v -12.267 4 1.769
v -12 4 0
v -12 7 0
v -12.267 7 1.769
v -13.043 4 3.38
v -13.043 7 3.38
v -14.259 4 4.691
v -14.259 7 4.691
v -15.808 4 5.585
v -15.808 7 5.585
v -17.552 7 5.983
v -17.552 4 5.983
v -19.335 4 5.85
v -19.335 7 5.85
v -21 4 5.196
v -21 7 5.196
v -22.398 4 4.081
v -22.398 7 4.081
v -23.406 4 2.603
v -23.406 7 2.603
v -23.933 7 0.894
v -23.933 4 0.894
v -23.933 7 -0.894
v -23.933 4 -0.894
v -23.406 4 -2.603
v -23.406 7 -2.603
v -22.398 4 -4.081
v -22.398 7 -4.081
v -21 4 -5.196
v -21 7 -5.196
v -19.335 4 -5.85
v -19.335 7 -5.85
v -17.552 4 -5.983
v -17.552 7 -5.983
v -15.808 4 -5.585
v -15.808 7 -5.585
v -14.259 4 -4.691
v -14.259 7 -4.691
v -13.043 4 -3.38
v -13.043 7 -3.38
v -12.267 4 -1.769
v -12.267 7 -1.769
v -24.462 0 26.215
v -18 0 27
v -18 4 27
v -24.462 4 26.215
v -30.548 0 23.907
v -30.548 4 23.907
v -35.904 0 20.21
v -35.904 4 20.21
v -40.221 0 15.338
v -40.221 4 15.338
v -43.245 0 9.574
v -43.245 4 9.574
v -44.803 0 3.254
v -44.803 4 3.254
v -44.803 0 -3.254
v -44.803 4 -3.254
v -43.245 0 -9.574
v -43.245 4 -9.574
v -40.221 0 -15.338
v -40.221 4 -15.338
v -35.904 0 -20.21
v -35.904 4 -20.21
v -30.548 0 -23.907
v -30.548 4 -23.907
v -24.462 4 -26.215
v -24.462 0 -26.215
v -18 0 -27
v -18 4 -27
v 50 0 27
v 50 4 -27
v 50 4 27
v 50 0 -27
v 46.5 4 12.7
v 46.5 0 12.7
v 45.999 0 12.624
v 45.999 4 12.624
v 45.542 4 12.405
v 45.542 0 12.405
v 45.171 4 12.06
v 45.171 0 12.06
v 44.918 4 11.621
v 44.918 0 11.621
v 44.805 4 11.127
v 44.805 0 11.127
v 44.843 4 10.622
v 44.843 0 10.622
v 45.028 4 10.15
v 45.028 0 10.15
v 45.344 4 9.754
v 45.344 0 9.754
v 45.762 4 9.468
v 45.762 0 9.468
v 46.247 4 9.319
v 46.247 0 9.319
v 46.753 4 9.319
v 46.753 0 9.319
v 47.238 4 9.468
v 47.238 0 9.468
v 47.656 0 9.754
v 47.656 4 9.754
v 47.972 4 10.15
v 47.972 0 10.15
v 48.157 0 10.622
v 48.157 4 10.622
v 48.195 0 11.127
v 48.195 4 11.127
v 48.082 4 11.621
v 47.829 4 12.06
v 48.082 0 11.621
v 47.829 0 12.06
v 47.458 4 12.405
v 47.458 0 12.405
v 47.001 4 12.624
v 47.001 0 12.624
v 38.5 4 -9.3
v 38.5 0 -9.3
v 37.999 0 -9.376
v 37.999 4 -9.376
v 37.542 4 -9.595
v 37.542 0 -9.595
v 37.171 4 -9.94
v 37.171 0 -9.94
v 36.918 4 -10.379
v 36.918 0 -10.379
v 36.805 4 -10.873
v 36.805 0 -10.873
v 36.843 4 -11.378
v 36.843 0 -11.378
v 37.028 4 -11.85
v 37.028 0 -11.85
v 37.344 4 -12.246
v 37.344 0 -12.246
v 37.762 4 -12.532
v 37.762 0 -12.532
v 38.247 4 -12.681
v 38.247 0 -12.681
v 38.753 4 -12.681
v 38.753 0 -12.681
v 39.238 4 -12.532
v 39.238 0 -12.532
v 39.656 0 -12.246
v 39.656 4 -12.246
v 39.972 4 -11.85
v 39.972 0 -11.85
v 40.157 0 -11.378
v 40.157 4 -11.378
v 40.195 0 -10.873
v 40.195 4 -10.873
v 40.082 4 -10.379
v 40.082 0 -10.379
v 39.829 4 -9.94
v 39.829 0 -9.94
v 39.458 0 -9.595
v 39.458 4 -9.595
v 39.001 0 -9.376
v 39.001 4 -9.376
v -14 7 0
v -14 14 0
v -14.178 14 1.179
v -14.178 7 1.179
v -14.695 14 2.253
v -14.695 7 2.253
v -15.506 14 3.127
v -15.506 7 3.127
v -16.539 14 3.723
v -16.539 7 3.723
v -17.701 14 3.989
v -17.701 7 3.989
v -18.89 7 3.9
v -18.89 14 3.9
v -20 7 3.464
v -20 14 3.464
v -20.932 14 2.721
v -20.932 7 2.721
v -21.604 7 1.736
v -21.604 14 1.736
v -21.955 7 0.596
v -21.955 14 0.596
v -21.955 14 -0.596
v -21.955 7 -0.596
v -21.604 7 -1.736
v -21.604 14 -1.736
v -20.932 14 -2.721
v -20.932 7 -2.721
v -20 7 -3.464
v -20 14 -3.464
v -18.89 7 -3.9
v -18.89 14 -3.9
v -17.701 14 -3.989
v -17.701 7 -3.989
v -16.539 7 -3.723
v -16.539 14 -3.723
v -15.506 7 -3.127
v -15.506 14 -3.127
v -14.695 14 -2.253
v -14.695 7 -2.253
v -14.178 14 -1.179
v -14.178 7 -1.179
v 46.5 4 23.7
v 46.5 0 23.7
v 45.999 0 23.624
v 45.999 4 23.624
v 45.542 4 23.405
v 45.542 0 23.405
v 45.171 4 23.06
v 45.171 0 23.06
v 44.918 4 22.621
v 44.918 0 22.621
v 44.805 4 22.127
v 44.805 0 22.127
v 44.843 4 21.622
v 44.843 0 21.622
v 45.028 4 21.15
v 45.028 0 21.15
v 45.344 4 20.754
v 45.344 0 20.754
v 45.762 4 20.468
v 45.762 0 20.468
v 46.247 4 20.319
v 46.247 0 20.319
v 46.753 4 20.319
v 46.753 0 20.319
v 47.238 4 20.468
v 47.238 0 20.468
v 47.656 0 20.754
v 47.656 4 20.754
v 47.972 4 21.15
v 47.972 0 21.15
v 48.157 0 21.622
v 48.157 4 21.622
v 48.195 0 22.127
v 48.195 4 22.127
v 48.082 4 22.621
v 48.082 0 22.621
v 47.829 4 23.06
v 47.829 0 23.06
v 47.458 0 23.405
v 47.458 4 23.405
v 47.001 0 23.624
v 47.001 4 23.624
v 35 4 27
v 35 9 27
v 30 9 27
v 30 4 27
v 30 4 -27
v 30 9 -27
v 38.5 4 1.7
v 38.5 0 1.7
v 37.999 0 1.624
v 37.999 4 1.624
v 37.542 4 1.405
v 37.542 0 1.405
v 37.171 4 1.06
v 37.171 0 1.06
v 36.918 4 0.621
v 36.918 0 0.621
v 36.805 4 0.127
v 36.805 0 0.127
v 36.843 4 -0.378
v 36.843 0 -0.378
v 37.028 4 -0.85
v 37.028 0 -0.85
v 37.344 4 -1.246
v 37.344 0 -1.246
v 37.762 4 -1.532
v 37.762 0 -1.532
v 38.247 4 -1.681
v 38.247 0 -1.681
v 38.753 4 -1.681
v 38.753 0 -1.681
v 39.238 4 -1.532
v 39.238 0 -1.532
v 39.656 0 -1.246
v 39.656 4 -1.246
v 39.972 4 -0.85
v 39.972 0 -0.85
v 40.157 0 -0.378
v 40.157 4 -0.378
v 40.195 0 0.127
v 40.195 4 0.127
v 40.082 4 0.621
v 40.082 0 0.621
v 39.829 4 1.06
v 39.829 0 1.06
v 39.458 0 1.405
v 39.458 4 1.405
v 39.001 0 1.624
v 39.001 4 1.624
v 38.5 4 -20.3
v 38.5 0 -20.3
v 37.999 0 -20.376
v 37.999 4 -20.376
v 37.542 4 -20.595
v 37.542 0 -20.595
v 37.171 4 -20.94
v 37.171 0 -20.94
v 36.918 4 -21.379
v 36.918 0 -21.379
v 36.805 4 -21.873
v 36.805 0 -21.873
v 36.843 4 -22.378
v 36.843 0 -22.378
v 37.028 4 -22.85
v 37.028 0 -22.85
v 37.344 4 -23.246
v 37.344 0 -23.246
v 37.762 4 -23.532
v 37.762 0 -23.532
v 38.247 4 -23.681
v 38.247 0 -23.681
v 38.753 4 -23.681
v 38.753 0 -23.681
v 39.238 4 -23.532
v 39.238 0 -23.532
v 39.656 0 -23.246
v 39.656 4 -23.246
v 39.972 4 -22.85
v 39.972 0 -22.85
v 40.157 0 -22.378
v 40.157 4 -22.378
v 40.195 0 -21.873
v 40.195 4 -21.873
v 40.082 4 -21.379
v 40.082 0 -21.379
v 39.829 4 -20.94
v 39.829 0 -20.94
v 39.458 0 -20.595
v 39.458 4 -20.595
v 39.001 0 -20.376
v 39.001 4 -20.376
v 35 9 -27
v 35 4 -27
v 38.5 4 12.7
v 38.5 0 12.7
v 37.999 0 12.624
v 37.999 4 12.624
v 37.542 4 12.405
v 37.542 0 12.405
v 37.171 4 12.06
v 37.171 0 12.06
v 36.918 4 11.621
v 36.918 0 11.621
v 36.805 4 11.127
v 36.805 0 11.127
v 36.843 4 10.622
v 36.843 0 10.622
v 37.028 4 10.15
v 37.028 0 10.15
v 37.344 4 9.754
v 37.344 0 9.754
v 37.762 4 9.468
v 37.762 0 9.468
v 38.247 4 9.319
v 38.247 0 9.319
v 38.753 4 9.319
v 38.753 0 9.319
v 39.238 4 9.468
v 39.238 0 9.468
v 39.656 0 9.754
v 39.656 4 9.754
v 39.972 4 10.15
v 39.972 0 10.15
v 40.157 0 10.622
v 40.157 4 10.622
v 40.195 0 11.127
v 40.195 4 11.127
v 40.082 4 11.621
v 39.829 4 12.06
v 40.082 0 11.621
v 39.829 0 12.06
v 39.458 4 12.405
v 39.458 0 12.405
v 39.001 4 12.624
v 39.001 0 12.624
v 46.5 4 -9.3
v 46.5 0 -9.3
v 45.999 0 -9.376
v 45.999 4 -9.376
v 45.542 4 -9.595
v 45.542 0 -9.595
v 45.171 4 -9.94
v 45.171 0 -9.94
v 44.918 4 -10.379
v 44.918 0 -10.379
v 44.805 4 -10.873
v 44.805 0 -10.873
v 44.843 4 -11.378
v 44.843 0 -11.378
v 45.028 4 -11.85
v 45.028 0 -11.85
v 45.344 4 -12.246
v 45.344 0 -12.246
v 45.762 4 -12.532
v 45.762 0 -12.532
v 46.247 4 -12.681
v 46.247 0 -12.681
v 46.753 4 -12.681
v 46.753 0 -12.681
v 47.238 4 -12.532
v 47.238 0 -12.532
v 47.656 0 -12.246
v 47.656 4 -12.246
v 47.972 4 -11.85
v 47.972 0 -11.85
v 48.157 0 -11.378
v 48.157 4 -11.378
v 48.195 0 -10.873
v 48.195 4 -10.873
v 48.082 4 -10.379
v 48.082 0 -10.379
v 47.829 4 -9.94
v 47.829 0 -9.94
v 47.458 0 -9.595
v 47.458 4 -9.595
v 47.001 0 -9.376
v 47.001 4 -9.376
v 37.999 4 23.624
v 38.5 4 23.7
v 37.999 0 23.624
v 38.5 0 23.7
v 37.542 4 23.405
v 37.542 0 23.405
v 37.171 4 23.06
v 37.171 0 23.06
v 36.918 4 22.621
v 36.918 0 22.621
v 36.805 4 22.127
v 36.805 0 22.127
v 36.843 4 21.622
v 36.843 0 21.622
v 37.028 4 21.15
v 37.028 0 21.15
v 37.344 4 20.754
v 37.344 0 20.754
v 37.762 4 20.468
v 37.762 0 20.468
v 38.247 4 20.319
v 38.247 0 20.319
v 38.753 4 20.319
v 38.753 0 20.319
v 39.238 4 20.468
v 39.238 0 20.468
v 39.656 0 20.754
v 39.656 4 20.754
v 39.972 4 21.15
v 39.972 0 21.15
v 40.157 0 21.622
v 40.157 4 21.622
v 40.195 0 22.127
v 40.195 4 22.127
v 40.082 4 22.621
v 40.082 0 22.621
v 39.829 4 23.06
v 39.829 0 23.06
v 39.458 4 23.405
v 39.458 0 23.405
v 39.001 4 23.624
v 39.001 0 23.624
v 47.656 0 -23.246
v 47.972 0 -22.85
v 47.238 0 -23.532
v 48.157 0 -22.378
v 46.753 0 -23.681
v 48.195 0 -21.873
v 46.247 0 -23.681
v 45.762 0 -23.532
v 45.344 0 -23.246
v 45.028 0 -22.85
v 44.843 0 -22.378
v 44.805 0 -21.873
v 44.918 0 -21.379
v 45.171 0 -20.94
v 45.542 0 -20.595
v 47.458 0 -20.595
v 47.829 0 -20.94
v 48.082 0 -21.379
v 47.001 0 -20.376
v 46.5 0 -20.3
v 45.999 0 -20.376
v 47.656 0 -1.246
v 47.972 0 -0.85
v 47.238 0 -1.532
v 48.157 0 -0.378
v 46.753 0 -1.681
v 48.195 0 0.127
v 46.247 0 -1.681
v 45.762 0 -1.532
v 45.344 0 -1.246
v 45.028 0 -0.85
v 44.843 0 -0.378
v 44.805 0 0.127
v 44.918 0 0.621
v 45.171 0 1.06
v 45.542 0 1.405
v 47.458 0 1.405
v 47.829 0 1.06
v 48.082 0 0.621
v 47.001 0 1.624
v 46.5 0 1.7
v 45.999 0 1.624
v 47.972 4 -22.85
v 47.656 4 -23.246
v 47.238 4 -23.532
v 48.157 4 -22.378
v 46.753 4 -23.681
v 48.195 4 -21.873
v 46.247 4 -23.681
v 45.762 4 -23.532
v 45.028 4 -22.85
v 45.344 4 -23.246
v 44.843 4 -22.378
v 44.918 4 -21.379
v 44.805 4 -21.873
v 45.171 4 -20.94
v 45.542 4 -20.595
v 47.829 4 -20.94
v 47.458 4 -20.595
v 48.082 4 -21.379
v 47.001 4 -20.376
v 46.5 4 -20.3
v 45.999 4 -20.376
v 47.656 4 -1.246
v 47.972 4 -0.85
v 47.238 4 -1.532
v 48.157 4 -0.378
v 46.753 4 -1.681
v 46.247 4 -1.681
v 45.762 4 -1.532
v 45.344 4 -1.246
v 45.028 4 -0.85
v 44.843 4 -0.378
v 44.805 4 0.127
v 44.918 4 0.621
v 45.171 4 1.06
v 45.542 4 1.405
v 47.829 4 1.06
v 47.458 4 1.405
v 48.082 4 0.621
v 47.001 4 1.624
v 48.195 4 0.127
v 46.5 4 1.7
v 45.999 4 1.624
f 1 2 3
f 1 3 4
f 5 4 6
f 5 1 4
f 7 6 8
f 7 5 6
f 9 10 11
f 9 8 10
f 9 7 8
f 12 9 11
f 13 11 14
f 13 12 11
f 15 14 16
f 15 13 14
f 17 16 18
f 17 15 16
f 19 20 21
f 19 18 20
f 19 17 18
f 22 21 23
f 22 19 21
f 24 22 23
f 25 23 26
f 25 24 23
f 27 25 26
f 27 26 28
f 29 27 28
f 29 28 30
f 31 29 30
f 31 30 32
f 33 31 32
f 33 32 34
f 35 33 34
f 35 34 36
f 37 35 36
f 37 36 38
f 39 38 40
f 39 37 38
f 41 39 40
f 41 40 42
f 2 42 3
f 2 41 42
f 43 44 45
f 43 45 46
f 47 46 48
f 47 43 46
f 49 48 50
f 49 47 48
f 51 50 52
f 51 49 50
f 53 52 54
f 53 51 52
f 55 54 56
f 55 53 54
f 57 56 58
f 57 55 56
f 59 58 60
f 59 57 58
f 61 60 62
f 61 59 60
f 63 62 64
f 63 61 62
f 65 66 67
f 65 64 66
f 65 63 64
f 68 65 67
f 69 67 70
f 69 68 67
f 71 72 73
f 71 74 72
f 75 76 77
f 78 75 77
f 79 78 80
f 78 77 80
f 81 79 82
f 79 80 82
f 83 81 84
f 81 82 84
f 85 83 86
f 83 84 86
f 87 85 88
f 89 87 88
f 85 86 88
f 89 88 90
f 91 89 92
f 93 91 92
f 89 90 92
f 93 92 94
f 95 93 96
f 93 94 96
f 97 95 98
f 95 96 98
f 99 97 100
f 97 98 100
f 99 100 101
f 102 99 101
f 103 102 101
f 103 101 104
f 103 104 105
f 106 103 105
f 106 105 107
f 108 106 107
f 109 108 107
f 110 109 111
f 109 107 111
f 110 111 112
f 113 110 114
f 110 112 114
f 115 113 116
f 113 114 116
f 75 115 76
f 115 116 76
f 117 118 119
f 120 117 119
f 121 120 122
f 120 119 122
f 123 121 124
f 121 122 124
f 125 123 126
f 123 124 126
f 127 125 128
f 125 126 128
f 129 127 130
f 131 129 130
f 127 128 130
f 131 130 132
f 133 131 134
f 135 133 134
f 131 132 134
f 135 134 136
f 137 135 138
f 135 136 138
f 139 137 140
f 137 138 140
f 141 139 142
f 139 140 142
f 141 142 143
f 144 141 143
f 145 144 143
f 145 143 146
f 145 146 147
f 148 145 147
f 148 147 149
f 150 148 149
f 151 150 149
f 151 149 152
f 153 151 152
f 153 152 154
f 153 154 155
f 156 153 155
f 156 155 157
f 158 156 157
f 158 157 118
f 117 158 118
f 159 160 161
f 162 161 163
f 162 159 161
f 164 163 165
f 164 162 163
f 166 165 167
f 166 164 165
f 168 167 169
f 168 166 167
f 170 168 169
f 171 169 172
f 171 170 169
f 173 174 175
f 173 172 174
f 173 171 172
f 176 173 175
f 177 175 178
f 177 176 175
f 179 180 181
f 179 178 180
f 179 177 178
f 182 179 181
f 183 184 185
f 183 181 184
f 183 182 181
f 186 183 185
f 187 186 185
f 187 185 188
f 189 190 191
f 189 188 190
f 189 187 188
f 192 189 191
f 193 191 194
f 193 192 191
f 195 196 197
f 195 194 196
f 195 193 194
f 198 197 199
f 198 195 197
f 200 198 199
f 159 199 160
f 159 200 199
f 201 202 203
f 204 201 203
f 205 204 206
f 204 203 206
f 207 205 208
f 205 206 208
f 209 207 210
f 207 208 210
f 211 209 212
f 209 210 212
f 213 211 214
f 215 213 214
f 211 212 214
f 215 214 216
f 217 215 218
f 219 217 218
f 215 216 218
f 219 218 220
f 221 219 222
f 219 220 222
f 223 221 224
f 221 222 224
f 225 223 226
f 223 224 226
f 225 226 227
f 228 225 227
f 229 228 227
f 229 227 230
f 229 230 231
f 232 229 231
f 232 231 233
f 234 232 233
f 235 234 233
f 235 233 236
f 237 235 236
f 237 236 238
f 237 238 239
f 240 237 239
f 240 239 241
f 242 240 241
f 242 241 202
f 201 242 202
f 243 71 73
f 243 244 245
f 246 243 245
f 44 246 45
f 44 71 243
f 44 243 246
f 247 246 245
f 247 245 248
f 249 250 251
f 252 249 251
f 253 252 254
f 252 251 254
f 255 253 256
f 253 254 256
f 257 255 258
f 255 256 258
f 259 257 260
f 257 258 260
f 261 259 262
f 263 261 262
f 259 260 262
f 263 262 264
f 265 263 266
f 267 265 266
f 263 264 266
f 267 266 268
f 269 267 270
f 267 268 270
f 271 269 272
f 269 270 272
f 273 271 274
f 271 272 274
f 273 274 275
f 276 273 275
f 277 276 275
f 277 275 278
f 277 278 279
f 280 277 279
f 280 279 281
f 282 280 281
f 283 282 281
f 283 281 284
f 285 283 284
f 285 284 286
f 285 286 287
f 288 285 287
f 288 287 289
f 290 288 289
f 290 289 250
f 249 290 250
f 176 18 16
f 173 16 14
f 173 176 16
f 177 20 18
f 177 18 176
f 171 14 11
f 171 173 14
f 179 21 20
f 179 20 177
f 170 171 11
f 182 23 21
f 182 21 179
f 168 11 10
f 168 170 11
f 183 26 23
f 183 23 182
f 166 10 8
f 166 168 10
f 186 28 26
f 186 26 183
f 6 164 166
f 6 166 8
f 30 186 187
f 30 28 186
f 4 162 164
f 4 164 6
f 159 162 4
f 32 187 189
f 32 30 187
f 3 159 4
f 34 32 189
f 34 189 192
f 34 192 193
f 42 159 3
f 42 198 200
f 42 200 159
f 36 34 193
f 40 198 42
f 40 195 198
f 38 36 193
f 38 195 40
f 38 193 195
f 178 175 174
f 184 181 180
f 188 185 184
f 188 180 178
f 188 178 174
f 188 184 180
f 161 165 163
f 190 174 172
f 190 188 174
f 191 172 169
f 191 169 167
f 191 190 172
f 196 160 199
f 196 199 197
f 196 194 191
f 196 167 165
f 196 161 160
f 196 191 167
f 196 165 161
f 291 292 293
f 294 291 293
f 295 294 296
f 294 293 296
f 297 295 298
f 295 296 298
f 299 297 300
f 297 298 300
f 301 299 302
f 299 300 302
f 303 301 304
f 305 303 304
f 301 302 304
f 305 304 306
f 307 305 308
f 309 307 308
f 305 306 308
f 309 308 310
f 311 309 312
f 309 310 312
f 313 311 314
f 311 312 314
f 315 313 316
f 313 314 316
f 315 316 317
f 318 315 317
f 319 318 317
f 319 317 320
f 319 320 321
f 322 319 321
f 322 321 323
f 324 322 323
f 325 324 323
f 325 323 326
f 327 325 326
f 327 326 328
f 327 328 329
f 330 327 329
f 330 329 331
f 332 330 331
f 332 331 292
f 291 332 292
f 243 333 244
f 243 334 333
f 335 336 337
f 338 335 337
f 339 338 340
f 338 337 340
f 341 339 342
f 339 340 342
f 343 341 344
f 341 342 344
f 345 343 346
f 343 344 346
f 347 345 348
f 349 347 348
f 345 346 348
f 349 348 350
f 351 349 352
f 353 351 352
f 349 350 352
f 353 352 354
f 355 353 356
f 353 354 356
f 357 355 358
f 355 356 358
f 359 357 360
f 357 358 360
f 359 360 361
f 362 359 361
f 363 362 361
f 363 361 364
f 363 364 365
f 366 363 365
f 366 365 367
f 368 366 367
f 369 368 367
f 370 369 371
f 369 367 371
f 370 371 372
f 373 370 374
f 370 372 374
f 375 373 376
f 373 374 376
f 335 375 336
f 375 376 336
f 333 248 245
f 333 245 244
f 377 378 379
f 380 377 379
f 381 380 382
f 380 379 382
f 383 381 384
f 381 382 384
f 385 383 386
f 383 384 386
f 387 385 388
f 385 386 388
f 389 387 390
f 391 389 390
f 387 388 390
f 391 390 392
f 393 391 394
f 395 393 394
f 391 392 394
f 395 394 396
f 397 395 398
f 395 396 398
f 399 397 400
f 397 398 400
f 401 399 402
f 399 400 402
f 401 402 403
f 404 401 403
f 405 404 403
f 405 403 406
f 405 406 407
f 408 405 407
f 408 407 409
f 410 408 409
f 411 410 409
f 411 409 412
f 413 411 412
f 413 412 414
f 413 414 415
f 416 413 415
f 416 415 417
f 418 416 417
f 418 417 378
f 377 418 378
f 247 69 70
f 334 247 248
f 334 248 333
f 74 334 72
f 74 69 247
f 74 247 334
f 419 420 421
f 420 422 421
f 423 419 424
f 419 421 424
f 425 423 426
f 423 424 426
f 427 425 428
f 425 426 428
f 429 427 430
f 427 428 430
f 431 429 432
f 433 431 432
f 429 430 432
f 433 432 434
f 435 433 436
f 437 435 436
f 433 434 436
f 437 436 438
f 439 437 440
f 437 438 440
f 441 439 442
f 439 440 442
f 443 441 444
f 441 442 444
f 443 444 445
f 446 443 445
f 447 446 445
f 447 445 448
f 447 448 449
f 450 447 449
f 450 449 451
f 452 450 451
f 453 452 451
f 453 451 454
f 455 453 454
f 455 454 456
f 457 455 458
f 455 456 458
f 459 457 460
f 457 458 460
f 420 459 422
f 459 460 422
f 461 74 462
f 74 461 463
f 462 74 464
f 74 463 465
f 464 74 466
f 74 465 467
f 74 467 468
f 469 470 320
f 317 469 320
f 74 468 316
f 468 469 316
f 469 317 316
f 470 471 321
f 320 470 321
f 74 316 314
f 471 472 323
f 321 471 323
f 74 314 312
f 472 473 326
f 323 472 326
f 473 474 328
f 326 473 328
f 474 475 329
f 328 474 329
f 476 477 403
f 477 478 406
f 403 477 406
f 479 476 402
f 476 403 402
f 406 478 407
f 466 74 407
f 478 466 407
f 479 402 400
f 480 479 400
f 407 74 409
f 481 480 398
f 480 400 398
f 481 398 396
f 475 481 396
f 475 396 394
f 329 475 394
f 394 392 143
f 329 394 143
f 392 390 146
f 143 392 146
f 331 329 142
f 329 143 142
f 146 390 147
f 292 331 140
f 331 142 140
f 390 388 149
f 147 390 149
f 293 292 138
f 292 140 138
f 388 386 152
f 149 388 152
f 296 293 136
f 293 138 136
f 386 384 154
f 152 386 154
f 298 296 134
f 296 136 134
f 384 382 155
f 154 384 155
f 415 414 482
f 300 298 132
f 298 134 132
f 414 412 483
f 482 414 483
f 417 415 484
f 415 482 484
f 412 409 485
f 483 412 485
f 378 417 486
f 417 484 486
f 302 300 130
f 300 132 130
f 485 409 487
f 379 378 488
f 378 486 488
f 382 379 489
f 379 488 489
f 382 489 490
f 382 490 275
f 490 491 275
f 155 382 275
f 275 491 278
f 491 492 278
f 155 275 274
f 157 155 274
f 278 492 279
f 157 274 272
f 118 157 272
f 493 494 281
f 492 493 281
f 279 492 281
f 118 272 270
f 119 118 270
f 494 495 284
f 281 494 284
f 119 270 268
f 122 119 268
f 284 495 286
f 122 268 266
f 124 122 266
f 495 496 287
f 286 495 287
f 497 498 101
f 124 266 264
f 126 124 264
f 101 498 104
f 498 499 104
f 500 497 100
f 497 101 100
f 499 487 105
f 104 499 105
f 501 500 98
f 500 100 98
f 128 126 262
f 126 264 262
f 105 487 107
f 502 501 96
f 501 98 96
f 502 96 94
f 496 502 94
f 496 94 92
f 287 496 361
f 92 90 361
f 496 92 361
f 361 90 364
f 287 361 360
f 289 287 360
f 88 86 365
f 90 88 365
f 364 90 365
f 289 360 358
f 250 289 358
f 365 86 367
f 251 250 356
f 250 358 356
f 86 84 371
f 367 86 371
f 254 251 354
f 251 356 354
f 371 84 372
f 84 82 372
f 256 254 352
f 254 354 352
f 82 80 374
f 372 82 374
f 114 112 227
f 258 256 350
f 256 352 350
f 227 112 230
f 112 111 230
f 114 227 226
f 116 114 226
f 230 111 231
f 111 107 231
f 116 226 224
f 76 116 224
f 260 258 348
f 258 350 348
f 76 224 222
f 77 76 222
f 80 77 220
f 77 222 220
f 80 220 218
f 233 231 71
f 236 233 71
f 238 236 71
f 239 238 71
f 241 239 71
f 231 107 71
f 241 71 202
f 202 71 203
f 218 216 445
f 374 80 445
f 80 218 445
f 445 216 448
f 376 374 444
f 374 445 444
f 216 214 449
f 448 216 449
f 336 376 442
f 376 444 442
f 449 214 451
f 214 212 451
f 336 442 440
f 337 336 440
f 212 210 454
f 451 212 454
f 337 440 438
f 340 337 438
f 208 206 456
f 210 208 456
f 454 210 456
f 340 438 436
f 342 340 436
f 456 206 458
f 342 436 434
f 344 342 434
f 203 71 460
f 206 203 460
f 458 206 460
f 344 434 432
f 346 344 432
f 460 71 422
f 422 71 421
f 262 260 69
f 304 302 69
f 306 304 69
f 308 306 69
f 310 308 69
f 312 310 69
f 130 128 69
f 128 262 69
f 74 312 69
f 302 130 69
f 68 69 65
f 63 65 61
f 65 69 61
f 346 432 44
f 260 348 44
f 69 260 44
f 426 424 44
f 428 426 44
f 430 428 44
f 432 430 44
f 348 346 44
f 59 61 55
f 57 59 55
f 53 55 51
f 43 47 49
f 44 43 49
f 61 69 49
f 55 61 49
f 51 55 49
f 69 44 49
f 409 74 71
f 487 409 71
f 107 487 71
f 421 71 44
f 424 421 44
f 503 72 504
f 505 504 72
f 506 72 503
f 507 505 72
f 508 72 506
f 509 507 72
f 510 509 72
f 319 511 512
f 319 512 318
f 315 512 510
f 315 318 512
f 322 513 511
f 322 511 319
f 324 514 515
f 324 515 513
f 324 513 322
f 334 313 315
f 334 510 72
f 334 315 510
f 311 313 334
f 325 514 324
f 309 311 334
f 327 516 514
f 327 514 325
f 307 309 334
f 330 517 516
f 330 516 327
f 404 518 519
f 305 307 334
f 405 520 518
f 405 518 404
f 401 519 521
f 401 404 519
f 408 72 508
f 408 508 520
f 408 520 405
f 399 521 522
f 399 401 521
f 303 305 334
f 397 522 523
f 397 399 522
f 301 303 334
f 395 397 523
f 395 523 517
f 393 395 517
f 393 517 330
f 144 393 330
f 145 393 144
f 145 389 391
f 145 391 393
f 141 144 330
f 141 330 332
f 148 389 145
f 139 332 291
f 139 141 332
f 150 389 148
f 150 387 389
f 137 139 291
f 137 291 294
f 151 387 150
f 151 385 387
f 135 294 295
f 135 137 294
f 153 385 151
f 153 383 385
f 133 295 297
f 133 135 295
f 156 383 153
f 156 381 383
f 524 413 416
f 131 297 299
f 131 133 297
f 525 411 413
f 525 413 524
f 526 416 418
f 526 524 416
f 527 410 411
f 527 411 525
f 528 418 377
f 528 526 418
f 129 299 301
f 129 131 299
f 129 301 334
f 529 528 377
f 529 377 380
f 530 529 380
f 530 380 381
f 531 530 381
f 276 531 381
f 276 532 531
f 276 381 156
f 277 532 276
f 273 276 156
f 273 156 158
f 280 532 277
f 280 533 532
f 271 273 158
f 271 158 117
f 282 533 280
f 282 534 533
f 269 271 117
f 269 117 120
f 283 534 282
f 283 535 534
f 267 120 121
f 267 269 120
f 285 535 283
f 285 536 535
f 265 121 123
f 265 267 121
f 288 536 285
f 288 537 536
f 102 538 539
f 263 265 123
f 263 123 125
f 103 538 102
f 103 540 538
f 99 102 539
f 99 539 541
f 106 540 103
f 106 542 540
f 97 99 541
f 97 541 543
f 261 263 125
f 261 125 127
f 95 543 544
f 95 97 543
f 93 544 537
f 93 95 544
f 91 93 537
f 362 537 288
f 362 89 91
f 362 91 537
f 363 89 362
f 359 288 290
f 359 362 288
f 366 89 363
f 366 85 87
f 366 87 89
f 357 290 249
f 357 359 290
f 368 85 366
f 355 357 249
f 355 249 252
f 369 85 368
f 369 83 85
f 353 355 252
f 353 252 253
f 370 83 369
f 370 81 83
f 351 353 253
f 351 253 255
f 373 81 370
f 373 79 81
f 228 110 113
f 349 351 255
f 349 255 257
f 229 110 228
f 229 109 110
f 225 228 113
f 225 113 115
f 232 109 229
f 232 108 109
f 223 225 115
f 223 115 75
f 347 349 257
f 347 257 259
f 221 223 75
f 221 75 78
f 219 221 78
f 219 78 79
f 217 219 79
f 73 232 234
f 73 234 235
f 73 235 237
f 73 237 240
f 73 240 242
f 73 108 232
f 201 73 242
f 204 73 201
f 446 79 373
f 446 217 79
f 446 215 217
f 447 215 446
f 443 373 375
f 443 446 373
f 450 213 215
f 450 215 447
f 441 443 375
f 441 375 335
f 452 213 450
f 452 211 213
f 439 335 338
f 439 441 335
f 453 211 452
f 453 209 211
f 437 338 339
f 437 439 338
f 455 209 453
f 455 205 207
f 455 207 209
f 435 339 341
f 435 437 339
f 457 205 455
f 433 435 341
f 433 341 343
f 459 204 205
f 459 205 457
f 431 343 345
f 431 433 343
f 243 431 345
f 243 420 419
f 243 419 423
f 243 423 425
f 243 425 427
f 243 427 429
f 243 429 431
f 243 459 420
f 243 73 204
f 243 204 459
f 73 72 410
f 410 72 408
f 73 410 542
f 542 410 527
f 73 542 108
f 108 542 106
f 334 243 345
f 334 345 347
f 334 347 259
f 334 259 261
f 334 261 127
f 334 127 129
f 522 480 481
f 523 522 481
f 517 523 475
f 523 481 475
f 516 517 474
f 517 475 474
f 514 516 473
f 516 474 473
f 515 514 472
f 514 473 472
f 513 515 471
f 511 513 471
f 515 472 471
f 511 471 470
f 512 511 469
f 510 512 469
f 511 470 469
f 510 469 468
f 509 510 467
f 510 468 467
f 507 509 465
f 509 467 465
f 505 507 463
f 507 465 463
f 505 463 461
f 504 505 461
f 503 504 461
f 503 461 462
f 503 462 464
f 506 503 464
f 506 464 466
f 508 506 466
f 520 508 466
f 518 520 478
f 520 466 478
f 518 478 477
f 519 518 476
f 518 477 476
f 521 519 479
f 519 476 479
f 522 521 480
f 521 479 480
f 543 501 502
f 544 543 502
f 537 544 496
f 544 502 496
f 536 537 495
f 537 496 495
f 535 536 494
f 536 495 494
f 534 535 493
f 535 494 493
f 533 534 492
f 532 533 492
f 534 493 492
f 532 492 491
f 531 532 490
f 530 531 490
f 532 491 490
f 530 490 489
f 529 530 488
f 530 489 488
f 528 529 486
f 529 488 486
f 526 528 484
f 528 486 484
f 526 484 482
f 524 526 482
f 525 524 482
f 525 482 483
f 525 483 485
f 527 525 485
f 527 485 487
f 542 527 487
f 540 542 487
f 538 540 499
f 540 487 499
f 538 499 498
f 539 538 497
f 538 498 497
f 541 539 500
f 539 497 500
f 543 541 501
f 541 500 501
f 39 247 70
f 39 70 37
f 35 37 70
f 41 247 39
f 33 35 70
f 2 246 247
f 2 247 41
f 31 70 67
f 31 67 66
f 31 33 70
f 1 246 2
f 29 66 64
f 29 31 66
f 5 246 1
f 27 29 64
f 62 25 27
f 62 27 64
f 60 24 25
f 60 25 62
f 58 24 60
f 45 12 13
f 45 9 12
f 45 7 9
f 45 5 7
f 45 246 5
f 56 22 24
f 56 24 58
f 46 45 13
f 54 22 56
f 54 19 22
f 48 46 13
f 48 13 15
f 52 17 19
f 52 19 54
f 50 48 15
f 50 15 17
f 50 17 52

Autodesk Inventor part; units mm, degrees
ref_plane "YZ Plane" through (0, 0, 0) normal (1, 0, 0) x (0, 1, 0)
ref_plane "XZ Plane" through (0, 0, 0) normal (0, 1, 0) x (-1, 0, 0)
ref_plane "XY Plane" through (0, 0, 0) normal (0, 0, 1) x (1, 0, 0)
sketch "Skizze1" plane through (0, 0, 0) normal (0, 1, 0) x (-1, 0, 0)
  line L0 (-50, 27) -> (50, 27)
  line L1 (50, 27) -> (50, -27) construction
  line L2 (50, -27) -> (-50, -27)
  line L3 (-50, -27) -> (-50, 27)
  line L4 (-50, 27) -> (50, -27) construction
  line L5 (50, 27) -> (-50, -27) construction
  line L6 (0, 0) -> (66.4326, 0) construction
  arc A0 (18, -27) -> (18, 27) centre (18, 0) ccw
  dimension "d0" = 54
  dimension "d1" = 100
  dimension "d12" = 68
  dimension "d13" = 90
extrude "Extrusion1" add sketch "Skizze1" along normal blind 4
sketch "Skizze3" plane through (0, 4, 0) normal (0, 1, 0) x (1, 0, 0)
  circle A0 centre (-18, 0) radius 6
  line L0 (0, 0) -> (-17.1865, 0) construction
  line L1 (50, -27) -> (50, 27) construction
  line L2 (-18, -27) -> (50, -27) projected
  line L3 (50, -27) -> (50, 27) construction
  line L4 (50, 27) -> (-18, 27) construction
  line L5 (-18, -27) -> (50, -27) construction
  line L6 (50, 27) -> (-18, 27) construction
  arc A1 (-18, 27) -> (-18, -27) centre (-18, 0) ccw projected
  point P0 (-50, -27)
  point P1 (-50, 27)
  dimension "d8" = 12
  dimension "d9" = 68
extrude "Extrusion3" [suppressed]
sketch "Skizze5" plane through (0, 4, 0) normal (0, 1, 0) x (1, 0, 0)
  line L0 (-18, -27) -> (50, -27) projected
  line L1 (50, -27) -> (50, 27) projected
  line L2 (50, 27) -> (-18, 27) projected
  arc A0 (-18, 27) -> (-18, -27) centre (-18, 0) ccw projected
  line L3 (35, -27) -> (30, -27)
  line L4 (30, -27) -> (30, 27)
  line L5 (30, 27) -> (35, 27)
  line L6 (35, 27) -> (35, -27)
  point P0 (0, 0)
  dimension "d14" = 15
  dimension "d15" = 5
extrude "Extrusion4" add sketch "Skizze5" along normal blind 5 contours L4 L2 L6 L0
sketch "Skizze6" plane through (0, 4, 0) normal (0, 1, 0) x (1, 0, 0)
  line L0 (35, 27) -> (35, -27) projected
  line L1 (35, -27) -> (50, -27) projected
  line L2 (50, -27) -> (50, 27) projected
  line L3 (50, 27) -> (35, 27) projected
  line L4 (0, 0) -> (67.4565, 0) construction
  point P0 (46.5, 0)
  dimension "d18" = 3.5
hole "Bohrung1" at (46.5, 4, 0) direction (0, -1, 0) diameter 3.4 end through all clearance for "Inbusschraube ISO 4762" size "M3" standard "ISO"
pattern_linear "Rechteckige Anordnung1" count 5 spacing 11 along (0, 0, -1) count 2 spacing 8 along (-1, 0, 0) of "Bohrung1" first direction both ways yes
sketch "Skizze7" plane through (0, 0, 0) normal (0, -1, 0) x (1, 0, 0)
  circle A0 centre (-18, 0) radius 6 projected
  circle A1 centre (-18, 0) radius 10 construction
  line L0 (-18, -12.7159) -> (-18, 15.8855)
  line L1 (-33.0539, 0) -> (-6.7164, 0)
  point P0 (0, 0)
  point P1 (-18, -10)
  point P2 (-28, 0)
  point P3 (-18, 10)
  point P4 (-8, 0)
  dimension "d32" = 20
hole "Bohrung2" [suppressed]
sketch "Skizze8" plane through (0, 4, 0) normal (0, 1, 0) x (1, 0, 0)
  arc A0 (-18, 27) -> (-18, -27) centre (-18, 0) ccw projected
  circle A1 centre (-18, 0) radius 6
  circle A2 centre (-18, 0) radius 4
  point P0 (0, 0)
  dimension "d40" = 12
  dimension "d43" = 8
extrude "Extrusion5" add sketch "Skizze8" along normal blind 3 contours A1 | A2
extrude "Extrusion6" add sketch "Skizze8" along normal blind 10 contours A2
properties part number "dynamixel_pro_frame_part2" material "Aluminium 6061"
